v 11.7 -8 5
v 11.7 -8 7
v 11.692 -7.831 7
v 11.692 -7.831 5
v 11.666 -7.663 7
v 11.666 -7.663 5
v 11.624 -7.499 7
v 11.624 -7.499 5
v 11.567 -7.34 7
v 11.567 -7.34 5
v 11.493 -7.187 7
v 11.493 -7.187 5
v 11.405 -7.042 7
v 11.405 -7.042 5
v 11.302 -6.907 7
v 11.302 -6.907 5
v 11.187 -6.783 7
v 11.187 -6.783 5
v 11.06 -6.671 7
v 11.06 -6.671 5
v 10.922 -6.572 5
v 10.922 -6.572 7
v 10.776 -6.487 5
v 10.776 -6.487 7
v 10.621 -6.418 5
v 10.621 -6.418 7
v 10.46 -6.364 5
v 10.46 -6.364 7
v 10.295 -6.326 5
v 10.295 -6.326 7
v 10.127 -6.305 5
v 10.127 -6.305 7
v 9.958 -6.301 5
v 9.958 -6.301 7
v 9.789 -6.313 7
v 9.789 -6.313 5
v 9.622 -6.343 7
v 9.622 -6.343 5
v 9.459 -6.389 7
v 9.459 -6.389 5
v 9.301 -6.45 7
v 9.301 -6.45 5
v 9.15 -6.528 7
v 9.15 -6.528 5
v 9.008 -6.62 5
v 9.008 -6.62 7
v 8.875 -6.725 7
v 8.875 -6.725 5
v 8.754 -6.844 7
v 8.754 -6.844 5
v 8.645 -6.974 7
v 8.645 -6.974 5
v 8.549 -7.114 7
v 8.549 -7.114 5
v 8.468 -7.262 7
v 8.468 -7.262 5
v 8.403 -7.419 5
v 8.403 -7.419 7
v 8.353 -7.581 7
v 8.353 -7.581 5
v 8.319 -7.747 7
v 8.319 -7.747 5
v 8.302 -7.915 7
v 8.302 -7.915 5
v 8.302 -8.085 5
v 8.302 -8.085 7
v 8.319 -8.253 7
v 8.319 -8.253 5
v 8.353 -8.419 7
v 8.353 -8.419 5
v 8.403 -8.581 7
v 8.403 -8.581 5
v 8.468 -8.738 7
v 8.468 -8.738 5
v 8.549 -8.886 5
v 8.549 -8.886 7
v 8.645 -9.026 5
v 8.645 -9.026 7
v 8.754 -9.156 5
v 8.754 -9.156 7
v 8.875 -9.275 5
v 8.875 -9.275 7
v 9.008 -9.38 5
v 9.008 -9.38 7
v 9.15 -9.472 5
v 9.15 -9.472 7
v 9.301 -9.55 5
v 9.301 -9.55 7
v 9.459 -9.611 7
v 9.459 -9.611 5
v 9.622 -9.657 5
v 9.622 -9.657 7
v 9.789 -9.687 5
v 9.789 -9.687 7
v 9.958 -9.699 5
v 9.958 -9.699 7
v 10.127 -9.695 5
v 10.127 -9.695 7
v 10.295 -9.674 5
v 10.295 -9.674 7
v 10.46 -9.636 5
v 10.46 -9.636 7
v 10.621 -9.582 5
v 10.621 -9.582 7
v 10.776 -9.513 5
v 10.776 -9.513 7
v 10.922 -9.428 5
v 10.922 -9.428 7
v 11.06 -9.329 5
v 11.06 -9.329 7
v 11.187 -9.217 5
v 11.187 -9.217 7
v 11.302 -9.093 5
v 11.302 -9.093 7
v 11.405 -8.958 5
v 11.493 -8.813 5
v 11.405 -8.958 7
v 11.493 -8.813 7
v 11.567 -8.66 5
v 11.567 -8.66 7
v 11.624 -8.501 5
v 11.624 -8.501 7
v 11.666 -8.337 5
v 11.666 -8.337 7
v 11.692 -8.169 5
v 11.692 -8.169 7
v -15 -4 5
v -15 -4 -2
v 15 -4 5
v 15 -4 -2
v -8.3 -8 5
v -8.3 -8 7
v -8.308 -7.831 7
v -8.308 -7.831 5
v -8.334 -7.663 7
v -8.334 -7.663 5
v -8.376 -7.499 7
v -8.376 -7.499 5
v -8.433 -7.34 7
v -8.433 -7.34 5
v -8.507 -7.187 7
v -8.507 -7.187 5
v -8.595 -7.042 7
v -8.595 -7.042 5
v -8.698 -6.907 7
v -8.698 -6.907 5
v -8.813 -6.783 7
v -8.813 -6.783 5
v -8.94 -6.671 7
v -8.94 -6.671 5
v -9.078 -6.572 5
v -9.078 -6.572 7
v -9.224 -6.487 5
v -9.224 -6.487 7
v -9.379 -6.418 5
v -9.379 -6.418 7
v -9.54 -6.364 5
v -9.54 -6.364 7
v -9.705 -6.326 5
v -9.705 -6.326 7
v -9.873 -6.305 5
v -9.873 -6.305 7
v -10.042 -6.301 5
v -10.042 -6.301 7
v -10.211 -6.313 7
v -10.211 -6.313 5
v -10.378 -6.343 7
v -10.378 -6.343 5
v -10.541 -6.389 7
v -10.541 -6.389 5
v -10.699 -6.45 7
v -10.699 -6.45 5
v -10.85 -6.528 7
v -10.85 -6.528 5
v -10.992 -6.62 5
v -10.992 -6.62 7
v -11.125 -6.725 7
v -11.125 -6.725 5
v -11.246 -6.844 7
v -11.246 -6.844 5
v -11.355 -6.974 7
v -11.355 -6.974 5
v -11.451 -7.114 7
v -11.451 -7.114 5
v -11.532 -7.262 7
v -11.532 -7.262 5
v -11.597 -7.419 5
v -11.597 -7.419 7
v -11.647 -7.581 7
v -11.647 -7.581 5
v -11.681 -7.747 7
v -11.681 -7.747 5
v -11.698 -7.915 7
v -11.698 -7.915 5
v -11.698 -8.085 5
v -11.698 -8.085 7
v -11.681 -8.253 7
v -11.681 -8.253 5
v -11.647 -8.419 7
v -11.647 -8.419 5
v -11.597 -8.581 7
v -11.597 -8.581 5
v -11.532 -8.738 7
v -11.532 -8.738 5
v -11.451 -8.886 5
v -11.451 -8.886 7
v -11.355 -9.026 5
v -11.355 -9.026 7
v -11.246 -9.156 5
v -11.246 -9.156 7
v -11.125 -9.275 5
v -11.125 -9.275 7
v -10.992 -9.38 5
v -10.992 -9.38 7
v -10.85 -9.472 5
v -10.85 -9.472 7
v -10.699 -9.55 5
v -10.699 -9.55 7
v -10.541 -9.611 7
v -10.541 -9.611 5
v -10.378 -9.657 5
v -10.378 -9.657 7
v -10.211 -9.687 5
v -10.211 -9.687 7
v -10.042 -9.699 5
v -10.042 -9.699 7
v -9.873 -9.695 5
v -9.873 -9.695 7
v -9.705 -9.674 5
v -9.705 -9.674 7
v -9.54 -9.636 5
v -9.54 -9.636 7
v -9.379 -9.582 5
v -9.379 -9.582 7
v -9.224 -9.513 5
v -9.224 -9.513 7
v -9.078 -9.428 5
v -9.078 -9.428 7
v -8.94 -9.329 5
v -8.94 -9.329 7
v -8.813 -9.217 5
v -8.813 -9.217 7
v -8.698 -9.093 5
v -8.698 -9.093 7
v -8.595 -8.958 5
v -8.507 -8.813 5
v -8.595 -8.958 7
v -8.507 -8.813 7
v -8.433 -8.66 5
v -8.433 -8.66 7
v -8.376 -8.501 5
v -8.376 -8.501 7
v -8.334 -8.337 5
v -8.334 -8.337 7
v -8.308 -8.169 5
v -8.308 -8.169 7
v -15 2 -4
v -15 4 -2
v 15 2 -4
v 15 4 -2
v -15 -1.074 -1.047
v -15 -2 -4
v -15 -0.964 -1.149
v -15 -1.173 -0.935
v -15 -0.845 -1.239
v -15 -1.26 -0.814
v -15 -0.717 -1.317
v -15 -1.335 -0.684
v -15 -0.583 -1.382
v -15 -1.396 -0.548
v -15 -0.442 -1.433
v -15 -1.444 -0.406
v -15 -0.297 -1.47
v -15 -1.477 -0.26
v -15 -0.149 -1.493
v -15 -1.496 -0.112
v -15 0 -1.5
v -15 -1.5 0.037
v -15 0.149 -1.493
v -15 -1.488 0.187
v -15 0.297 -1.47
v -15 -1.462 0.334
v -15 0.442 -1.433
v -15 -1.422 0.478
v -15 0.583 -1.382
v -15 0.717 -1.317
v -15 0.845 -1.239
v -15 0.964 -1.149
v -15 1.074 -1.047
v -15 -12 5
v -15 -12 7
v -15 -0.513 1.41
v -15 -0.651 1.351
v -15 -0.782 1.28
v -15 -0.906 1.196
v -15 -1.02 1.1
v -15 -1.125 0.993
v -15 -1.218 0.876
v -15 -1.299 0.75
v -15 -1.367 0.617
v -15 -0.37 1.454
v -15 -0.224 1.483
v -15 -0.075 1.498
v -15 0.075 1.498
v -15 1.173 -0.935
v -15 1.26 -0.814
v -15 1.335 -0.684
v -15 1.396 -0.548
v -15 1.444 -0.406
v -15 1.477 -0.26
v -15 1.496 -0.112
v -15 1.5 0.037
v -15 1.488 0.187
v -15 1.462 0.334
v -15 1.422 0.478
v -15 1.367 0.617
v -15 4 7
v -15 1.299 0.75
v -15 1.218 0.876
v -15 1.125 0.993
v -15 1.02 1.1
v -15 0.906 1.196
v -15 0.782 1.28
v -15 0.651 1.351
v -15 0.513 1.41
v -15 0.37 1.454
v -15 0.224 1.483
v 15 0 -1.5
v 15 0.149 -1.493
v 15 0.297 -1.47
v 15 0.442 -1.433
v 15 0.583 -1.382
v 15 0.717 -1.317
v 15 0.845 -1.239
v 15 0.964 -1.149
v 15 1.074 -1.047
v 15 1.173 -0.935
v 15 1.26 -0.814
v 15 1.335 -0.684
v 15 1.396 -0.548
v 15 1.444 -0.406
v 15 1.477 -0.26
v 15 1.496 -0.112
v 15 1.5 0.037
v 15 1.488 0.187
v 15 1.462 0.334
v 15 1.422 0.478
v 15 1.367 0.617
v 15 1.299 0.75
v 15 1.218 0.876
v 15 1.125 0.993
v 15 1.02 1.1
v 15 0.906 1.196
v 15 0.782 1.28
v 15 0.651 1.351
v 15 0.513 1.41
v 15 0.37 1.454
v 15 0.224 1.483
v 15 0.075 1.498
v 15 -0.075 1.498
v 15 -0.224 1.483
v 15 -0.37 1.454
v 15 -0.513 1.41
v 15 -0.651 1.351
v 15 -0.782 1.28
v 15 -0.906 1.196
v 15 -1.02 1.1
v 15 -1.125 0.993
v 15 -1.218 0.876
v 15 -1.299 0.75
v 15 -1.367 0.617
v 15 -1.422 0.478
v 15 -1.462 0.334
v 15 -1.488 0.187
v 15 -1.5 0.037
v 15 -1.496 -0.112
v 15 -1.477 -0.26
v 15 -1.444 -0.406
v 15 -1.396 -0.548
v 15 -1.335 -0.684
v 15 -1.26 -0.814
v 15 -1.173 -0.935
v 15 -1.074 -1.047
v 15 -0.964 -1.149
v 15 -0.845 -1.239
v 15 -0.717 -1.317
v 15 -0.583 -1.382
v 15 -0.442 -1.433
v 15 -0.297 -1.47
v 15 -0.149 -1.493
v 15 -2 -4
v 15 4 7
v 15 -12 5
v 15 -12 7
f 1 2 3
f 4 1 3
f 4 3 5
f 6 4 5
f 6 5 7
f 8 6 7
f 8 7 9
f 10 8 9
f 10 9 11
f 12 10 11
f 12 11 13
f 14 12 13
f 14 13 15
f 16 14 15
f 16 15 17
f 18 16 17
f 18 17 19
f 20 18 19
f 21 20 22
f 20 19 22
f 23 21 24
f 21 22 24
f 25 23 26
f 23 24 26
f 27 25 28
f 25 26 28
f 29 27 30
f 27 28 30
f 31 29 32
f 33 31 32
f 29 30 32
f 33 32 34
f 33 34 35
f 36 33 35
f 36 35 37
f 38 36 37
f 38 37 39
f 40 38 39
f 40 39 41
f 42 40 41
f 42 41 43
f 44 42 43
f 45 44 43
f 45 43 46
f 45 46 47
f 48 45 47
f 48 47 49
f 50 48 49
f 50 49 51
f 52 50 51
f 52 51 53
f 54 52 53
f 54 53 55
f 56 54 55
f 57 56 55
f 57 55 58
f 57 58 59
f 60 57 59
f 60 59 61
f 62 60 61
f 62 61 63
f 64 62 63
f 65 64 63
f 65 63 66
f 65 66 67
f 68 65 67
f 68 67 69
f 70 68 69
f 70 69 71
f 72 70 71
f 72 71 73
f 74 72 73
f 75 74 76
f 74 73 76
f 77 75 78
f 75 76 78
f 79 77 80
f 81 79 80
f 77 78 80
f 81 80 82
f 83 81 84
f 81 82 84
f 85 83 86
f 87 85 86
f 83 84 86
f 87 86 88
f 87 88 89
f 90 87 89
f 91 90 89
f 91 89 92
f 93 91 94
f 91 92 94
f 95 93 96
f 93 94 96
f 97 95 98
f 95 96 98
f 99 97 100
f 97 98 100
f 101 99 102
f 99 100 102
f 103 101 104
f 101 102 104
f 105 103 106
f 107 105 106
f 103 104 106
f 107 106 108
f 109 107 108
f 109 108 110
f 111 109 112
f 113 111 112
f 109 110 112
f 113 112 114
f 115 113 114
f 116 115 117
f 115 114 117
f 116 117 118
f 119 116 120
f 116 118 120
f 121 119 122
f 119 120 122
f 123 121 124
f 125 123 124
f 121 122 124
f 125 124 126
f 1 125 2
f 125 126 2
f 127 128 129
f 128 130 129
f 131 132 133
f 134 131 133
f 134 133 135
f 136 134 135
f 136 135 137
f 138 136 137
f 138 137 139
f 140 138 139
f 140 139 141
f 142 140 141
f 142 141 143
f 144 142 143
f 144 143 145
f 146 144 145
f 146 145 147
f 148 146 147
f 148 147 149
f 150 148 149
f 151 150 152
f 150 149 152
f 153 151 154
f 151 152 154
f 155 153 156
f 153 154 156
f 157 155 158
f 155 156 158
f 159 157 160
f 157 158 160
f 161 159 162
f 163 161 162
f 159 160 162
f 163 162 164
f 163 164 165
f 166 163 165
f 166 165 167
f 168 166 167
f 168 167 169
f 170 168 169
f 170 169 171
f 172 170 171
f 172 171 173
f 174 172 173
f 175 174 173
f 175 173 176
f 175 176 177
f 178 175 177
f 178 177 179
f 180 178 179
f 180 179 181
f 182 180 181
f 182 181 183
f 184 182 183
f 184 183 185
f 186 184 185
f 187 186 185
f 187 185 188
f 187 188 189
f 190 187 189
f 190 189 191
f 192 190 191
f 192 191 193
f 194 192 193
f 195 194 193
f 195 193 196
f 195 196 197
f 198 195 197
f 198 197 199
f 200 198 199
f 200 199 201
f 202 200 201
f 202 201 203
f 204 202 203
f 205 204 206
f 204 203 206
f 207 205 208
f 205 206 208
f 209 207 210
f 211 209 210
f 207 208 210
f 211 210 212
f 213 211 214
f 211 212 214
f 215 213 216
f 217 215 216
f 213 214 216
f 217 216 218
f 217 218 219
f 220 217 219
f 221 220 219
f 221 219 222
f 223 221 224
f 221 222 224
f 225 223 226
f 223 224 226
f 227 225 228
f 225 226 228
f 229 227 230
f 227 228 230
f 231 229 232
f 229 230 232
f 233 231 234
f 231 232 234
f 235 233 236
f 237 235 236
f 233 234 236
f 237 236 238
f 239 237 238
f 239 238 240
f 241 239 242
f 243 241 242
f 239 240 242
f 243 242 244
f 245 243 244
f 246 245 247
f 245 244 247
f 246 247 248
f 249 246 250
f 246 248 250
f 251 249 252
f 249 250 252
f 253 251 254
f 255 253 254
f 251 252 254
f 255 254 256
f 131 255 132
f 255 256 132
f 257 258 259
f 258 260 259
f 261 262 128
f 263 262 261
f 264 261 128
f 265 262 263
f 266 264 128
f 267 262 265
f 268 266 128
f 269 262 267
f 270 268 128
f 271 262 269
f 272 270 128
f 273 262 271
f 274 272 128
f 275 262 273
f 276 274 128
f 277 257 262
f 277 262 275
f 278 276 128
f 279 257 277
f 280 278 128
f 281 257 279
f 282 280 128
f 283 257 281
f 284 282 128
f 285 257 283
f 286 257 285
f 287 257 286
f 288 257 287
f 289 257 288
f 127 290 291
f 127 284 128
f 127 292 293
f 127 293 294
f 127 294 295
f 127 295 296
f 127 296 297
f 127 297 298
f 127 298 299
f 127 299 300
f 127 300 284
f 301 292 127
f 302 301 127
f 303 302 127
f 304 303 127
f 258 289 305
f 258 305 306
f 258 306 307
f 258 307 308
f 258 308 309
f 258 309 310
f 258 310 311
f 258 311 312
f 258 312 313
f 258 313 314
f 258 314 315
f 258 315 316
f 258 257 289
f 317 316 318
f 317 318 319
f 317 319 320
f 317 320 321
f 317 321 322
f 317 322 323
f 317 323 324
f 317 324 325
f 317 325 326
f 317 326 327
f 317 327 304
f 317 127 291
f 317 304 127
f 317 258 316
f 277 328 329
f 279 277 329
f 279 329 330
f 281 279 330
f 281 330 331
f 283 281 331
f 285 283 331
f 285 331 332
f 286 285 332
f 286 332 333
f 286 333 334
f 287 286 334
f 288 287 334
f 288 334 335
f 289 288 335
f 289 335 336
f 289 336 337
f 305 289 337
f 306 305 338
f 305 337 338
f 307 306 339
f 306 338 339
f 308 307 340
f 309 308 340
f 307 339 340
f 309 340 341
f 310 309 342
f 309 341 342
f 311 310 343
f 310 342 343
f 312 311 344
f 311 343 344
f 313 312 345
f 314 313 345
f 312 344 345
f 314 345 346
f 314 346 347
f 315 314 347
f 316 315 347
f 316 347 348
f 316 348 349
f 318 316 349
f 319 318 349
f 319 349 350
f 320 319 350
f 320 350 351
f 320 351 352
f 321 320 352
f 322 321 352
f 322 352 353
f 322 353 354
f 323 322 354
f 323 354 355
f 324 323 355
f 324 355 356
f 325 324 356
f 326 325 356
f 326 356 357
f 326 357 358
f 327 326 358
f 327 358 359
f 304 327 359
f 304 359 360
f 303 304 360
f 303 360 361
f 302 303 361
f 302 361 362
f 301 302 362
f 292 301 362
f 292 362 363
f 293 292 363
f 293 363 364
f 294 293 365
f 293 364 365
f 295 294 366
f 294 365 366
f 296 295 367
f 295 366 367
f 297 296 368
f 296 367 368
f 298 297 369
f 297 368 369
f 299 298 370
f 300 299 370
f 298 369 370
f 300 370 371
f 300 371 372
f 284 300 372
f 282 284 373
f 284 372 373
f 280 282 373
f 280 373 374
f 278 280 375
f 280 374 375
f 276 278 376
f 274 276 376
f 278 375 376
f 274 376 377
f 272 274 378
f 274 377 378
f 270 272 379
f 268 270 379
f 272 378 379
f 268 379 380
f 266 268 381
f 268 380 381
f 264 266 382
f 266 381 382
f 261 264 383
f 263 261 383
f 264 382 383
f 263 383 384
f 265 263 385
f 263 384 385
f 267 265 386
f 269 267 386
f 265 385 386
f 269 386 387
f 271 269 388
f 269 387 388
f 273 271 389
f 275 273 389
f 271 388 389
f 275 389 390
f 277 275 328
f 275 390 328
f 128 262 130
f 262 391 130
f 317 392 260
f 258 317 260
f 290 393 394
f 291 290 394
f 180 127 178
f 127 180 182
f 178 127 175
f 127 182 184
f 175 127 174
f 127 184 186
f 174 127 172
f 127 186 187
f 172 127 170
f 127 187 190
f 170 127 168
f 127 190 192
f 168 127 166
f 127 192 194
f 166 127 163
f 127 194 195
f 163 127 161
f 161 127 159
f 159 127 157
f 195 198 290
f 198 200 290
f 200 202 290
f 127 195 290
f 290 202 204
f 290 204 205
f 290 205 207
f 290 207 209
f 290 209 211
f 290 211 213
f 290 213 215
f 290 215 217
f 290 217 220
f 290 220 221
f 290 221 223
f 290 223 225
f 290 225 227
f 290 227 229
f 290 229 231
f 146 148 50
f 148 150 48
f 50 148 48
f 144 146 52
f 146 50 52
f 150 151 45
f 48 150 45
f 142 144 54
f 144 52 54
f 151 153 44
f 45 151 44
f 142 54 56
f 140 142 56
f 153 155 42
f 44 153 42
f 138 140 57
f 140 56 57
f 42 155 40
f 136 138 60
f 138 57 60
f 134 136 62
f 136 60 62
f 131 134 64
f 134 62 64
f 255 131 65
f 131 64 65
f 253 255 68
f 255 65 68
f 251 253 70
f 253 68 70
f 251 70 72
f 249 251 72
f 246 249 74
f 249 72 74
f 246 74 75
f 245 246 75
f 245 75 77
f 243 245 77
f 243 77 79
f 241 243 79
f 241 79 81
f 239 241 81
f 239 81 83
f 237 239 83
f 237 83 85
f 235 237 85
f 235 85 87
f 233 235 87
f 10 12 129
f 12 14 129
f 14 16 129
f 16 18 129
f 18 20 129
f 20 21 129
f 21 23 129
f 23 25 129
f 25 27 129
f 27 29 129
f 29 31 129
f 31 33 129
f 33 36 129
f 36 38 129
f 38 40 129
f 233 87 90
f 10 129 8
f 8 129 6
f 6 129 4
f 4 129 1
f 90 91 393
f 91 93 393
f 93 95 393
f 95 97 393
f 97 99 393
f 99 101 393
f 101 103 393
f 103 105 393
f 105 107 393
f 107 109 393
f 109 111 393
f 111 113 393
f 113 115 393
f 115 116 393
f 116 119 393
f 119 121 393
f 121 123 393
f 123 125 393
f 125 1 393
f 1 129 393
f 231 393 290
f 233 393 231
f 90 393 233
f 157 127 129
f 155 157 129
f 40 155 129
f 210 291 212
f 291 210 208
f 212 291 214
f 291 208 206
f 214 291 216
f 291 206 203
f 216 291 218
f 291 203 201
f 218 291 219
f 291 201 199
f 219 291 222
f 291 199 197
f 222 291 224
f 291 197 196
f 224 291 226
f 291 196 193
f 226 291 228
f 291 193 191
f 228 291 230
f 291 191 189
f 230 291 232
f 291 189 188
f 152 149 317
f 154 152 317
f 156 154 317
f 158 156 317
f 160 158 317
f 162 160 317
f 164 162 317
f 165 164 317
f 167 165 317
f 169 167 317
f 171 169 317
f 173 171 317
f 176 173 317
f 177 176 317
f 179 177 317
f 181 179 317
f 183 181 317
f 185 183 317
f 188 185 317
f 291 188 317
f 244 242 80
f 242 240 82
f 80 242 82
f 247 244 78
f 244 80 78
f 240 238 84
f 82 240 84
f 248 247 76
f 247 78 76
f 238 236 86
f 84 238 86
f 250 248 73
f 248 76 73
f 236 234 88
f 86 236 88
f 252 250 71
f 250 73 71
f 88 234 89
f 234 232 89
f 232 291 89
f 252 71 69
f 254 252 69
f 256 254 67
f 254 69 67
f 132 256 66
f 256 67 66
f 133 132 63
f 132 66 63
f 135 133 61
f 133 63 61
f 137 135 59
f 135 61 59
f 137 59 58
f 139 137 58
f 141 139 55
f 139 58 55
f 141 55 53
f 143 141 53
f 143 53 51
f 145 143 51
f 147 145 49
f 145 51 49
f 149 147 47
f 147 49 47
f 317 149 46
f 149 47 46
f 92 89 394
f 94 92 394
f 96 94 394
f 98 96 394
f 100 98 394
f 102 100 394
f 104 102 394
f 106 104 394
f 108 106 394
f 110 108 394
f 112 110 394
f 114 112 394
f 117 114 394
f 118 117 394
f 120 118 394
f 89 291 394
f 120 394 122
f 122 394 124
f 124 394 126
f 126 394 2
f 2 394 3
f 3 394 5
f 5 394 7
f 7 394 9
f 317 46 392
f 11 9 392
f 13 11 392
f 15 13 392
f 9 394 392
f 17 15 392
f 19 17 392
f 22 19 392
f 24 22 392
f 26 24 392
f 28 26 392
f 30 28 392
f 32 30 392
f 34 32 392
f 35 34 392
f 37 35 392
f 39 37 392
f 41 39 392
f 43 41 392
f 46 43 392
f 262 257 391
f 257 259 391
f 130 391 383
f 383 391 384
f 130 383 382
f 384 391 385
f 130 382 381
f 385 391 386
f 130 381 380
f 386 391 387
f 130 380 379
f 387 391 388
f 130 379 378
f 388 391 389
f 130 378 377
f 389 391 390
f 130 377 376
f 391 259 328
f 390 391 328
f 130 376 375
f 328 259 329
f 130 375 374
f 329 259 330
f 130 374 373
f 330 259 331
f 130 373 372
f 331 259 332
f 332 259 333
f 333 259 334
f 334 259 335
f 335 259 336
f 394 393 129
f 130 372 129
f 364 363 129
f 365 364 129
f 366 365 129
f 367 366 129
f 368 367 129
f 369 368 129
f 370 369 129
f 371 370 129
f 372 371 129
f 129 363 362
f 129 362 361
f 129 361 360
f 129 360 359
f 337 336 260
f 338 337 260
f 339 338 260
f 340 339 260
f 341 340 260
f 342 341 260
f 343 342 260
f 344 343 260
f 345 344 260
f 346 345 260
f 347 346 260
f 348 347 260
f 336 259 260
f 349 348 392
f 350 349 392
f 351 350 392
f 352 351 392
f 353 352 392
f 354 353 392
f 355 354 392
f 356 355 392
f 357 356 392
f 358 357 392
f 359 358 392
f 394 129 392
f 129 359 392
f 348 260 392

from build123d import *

# Parameters (mm, degrees)
BOSS_EXTRUDE1_DEPTH     = 15
M3_CLEARANCE_HOLE1_D    = 3.4
SKETCH4_R               = 1.5
CUT_EXTRUDE1_DEPTH      = 1
CUT_EXTRUDE1_DEPTH_BACK = 31


with BuildPart() as part:
    # Sketch1 → Boss-Extrude1 (new body, symmetric)
    with BuildSketch(Plane(origin=(0, 0, 0), x_dir=(0, 0, -1), z_dir=(1, 0, 0))):
        Polygon((-7, 4), (2, 4), (4, 2), (4, -2), (2, -4), (-5, -4), (-5, -12), (-7, -12), align=None)
    extrude(amount=BOSS_EXTRUDE1_DEPTH, both=True)

    # M3 Clearance Hole1 (through all)
    with Locations(Plane(origin=(0, 0, 5), x_dir=(-1, 0, 0), z_dir=(0, 0, -1))):
        with Locations((-10, -8), (10, -8)):
            Hole(M3_CLEARANCE_HOLE1_D / 2)

    # Sketch4 → Cut-Extrude1 (cut, two sides)
    with BuildSketch(Plane(origin=(15, 0, 0), x_dir=(0, 0, -1), z_dir=(1, 0, 0))) as cut_extrude1_sk:
        Circle(SKETCH4_R)
    extrude(amount=CUT_EXTRUDE1_DEPTH, mode=Mode.SUBTRACT)
    extrude(cut_extrude1_sk.sketch, amount=-CUT_EXTRUDE1_DEPTH_BACK, mode=Mode.SUBTRACT)


solid = part.part
